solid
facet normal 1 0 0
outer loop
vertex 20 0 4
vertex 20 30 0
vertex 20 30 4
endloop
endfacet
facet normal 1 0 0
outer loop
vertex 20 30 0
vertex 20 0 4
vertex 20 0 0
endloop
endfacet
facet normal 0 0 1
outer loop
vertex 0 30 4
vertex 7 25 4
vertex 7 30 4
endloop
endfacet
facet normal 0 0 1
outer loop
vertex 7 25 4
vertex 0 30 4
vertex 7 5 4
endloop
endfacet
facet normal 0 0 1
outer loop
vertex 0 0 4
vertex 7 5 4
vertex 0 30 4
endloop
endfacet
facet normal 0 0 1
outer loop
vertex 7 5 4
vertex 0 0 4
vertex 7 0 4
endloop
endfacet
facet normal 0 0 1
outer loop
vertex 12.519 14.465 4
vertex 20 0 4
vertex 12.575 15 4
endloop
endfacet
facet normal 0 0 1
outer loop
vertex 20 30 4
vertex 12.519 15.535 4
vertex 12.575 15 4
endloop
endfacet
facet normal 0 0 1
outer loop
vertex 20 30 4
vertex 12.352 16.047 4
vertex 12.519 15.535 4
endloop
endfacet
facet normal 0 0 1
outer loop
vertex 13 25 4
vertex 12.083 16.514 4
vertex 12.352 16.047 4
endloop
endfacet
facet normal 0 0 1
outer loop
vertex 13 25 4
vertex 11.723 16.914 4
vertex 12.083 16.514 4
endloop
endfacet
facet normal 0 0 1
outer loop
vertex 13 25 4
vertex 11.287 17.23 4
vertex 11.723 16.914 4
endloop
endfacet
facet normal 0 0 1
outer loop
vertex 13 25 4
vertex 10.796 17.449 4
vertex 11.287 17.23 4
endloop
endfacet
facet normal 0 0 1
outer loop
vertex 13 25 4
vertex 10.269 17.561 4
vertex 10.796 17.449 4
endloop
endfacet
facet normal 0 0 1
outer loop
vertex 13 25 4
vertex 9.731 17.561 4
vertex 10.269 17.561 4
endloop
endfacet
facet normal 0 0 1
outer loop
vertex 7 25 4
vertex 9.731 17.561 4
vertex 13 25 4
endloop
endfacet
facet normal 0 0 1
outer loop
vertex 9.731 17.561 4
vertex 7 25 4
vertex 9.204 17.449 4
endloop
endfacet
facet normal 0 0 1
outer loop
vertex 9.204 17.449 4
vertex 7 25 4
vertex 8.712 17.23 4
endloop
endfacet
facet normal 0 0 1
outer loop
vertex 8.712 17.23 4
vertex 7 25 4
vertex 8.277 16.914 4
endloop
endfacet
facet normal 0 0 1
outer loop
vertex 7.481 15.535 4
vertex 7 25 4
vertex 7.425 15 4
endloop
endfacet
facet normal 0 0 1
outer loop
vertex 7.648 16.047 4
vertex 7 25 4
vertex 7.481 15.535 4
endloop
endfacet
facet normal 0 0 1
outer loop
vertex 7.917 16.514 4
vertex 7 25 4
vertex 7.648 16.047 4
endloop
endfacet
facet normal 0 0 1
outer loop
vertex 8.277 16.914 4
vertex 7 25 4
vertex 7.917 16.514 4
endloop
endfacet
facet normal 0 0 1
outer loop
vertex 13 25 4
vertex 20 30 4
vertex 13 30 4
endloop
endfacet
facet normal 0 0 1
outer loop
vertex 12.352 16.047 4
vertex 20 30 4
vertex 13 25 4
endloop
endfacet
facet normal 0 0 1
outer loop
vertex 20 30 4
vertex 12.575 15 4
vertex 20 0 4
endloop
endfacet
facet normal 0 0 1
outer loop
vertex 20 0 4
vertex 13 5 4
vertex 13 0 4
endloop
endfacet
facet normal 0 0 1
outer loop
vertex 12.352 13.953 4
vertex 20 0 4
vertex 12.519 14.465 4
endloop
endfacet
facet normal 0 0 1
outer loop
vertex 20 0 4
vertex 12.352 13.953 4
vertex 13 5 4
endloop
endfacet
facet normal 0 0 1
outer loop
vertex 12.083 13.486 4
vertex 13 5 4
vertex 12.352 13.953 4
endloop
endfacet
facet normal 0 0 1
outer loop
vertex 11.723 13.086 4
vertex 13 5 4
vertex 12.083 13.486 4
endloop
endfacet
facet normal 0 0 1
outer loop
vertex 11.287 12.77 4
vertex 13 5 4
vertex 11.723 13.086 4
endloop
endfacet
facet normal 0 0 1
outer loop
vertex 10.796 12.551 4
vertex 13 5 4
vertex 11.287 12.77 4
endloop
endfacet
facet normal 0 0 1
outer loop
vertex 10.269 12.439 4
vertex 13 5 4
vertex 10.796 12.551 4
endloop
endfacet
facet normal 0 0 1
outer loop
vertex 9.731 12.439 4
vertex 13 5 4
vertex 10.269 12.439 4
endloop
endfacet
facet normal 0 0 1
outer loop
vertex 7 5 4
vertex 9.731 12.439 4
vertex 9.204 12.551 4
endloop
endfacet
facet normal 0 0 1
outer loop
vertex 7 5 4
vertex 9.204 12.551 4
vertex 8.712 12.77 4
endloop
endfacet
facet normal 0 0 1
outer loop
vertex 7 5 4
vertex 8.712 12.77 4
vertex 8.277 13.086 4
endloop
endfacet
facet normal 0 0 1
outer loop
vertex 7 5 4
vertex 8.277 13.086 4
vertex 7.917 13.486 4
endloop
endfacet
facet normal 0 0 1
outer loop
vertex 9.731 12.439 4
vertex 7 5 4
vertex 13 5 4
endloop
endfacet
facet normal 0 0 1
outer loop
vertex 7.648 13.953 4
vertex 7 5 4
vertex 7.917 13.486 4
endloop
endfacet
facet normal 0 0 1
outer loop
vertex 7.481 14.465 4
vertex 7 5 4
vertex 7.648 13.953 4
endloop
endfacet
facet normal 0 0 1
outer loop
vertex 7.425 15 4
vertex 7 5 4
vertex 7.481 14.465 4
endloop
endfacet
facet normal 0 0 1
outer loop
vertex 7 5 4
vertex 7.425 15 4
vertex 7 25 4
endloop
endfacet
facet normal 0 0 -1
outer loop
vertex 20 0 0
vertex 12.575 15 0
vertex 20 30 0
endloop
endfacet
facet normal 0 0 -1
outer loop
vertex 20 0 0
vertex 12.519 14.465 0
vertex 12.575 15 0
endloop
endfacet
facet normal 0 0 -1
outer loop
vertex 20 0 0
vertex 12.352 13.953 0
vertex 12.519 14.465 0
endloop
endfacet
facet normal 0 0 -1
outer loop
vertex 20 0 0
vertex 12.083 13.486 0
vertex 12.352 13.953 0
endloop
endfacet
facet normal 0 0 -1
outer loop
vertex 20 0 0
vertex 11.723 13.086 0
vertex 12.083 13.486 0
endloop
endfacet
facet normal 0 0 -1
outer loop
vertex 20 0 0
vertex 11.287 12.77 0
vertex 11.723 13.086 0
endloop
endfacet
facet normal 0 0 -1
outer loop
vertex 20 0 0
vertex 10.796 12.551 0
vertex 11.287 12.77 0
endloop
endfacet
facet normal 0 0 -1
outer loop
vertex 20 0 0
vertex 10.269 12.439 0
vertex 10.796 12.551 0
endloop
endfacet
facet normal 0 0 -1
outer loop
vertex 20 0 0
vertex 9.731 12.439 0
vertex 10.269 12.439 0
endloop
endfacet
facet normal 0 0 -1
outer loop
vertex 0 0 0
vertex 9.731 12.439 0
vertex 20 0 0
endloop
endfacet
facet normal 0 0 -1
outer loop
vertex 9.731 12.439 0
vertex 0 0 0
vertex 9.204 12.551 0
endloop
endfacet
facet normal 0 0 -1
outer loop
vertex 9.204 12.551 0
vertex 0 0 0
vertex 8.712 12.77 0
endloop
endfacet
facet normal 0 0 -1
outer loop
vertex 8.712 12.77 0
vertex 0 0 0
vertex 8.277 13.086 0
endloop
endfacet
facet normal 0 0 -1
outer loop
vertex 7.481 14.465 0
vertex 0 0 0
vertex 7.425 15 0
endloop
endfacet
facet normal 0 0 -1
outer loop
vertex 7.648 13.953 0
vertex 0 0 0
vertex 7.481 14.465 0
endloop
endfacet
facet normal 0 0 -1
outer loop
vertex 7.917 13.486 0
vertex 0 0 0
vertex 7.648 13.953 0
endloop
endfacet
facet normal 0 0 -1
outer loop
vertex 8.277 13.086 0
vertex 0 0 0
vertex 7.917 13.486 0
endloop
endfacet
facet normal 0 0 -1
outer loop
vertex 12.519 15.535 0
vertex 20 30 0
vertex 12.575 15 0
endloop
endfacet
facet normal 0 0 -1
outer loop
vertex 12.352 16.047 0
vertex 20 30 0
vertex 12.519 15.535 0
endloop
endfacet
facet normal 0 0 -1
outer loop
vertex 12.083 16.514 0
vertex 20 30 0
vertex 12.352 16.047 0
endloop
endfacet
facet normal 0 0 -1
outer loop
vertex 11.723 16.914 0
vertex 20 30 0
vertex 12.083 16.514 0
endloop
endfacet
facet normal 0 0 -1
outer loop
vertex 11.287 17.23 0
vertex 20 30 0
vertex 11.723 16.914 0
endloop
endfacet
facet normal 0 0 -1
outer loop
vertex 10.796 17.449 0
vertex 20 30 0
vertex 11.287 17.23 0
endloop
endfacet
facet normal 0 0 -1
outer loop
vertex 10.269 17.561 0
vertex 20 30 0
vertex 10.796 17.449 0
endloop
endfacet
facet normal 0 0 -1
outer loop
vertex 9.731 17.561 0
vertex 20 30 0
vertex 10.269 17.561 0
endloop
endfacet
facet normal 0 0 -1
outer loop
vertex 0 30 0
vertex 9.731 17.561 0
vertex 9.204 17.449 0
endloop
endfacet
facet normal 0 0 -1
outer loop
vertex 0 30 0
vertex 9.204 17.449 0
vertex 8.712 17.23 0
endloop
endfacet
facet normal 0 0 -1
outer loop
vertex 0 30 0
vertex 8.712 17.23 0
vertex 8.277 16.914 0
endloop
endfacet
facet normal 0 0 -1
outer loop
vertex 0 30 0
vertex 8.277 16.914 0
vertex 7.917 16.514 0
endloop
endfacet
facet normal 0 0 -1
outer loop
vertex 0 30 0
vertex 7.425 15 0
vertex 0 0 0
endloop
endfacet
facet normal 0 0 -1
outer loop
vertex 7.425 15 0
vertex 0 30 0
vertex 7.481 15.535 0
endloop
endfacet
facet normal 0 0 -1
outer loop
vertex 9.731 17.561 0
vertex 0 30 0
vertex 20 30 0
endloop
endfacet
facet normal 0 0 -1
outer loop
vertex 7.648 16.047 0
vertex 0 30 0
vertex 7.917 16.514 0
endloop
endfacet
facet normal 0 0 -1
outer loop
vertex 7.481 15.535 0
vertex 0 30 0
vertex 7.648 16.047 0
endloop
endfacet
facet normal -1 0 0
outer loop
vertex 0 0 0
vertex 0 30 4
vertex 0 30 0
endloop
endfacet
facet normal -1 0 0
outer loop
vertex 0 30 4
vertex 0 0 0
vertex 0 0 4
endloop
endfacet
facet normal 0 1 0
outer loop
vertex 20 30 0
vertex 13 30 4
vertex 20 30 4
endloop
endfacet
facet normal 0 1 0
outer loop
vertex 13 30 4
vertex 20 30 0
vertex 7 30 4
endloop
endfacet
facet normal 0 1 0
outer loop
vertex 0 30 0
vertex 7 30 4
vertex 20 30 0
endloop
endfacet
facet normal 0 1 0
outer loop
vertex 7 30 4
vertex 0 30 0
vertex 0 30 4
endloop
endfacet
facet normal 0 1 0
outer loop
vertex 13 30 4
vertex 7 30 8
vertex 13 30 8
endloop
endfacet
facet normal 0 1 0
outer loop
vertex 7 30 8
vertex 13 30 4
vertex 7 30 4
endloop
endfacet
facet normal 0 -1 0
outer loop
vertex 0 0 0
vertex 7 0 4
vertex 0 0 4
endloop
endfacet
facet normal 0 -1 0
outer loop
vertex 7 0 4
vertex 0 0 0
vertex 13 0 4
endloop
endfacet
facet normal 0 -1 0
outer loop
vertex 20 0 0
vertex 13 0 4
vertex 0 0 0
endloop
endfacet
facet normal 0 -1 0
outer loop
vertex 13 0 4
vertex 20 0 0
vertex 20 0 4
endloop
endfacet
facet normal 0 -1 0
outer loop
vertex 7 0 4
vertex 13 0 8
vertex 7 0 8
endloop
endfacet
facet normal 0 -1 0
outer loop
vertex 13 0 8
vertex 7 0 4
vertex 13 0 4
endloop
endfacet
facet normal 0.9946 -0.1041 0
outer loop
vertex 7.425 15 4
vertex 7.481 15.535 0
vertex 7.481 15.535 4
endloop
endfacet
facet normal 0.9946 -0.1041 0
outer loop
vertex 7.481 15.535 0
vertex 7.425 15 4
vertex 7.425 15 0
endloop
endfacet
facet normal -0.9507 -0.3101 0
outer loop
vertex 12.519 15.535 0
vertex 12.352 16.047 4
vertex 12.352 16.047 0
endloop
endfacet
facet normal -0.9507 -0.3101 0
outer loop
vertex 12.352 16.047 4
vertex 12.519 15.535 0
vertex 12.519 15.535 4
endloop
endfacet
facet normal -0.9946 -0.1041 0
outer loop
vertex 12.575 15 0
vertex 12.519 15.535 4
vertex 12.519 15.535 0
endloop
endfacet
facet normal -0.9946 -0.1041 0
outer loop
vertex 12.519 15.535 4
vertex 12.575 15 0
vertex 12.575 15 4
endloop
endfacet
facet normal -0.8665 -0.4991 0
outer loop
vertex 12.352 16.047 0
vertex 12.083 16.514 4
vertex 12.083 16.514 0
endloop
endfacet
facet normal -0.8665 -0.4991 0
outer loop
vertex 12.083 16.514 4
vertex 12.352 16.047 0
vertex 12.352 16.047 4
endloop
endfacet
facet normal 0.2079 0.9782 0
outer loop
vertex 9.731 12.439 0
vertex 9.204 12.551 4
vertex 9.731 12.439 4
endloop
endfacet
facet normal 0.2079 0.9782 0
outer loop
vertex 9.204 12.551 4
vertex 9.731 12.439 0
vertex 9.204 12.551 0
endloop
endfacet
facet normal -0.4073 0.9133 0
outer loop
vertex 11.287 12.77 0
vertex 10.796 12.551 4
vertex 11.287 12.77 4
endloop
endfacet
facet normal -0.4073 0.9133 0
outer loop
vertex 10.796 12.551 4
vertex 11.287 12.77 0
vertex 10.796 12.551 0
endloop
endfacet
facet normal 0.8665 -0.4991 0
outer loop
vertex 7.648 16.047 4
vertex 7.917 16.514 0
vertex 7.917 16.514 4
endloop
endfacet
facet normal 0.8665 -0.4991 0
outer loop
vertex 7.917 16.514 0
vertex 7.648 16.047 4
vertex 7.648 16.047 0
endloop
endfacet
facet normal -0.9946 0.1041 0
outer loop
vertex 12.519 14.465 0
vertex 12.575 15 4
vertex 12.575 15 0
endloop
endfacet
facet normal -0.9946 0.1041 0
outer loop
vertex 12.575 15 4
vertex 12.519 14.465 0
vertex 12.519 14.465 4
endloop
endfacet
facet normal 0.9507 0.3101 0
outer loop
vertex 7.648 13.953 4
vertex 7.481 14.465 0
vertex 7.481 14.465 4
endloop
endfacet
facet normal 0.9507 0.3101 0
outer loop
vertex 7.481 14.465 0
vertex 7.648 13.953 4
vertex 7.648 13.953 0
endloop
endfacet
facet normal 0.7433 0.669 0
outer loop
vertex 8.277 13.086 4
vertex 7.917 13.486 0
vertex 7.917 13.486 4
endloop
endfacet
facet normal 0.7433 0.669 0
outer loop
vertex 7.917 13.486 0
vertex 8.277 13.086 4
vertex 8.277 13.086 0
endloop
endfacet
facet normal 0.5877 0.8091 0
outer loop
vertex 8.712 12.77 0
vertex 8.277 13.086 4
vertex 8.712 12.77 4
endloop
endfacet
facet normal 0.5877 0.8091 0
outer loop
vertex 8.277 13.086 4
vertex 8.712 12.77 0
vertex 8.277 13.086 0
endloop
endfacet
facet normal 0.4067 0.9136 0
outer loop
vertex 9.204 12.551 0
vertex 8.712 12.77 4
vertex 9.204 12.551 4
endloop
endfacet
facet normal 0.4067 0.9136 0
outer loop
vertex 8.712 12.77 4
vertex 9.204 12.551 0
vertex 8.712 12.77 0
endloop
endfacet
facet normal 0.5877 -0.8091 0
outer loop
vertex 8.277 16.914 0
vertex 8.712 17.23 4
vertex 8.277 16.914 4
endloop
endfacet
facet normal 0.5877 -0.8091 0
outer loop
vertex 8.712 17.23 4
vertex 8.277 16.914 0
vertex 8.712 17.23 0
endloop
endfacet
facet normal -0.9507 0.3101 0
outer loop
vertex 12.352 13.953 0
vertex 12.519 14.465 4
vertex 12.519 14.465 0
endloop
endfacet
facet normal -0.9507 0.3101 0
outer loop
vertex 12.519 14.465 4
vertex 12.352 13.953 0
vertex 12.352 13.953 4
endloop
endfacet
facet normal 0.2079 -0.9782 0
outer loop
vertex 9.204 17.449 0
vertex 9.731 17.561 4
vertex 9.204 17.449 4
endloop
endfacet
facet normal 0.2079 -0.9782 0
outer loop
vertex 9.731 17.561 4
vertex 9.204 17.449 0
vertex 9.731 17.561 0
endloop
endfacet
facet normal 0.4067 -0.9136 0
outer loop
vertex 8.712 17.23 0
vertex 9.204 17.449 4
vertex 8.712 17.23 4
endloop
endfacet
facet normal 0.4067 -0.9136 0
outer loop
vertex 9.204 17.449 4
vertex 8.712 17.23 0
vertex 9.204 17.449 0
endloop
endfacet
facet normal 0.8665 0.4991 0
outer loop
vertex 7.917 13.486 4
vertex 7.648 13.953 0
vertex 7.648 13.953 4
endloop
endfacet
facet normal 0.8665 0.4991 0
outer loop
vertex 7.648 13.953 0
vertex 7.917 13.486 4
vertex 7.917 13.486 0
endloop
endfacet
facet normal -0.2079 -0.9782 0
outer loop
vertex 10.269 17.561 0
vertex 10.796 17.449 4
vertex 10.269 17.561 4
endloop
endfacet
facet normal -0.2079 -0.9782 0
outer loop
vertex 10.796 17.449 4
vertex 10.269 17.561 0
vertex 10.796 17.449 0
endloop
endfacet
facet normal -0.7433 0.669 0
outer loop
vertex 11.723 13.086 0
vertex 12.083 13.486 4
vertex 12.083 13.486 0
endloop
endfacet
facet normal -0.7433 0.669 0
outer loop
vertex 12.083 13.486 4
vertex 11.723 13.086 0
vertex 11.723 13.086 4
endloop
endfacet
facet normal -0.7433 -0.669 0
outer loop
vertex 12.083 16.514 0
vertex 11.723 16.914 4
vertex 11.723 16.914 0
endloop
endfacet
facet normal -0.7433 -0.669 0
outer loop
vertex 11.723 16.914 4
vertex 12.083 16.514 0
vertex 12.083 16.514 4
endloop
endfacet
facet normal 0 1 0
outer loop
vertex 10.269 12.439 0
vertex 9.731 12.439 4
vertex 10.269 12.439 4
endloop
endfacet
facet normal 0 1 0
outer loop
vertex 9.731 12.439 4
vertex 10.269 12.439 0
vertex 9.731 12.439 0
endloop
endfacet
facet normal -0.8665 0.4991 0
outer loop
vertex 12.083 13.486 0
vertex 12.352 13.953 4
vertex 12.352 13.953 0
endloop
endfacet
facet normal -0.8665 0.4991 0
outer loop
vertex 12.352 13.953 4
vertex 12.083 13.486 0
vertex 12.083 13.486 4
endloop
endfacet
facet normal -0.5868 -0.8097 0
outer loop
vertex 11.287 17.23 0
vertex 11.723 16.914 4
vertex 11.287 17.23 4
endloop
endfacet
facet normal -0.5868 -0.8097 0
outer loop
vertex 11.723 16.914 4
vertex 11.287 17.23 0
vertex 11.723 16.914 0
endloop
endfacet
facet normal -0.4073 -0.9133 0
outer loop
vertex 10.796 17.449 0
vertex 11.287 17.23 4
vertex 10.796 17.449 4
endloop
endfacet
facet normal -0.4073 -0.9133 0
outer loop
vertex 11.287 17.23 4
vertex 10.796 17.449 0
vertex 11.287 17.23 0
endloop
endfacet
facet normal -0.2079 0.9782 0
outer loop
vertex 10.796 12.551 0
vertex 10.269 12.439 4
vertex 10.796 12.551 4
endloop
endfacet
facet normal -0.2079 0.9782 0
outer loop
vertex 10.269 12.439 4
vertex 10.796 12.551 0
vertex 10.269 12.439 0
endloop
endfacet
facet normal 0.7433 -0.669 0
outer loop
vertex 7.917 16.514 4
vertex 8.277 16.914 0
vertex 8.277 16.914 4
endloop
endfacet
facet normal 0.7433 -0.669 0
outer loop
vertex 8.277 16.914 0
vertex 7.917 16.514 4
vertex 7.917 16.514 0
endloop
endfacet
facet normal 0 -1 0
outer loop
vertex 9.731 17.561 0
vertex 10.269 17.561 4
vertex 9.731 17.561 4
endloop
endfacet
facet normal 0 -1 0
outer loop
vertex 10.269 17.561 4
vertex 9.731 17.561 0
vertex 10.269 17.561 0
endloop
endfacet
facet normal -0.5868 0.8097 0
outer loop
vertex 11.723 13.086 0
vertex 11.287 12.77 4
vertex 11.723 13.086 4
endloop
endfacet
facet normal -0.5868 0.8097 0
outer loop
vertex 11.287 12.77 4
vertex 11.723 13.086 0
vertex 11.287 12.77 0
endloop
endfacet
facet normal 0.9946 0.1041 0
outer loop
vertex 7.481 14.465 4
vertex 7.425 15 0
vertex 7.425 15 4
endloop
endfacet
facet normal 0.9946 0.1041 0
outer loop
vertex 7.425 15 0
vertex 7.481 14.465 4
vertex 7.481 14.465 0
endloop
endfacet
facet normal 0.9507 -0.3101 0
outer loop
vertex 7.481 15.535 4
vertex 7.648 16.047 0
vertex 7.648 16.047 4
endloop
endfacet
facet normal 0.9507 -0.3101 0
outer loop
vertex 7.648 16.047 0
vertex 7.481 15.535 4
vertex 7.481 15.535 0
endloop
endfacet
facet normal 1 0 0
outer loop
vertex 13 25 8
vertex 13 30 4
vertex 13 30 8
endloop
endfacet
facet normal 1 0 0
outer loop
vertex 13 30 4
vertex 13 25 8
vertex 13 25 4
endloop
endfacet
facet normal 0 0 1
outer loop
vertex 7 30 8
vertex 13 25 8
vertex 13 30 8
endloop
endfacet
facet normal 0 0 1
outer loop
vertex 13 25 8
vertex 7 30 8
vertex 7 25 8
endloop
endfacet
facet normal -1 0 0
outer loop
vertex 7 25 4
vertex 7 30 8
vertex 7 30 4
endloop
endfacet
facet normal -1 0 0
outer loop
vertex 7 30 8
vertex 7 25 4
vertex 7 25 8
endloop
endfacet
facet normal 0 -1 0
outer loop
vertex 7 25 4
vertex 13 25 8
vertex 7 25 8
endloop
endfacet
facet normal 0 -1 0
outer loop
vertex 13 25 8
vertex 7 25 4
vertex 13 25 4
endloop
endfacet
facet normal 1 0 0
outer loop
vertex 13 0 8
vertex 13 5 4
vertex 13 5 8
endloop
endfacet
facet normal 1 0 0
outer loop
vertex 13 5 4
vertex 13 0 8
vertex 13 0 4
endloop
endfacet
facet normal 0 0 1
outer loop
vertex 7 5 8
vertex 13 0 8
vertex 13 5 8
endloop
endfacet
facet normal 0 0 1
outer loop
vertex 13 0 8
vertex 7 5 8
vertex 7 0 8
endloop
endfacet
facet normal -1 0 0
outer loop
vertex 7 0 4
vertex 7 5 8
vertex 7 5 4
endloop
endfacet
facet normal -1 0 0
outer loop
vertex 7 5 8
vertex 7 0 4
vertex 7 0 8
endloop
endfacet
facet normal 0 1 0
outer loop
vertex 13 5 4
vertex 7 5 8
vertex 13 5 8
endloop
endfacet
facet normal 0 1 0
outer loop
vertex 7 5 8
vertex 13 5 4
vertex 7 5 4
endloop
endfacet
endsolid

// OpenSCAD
inner=6;
outer=20;
screwhole=5 + 0.15;
height=4;

stock=5;
stockheight=4;

module mount(length=30, holes=1)
{
	difference()
	{
		cube([outer,length,height]);
		
		union()
		{
			for(i=[1:holes])
			{
				translate([outer/2,i*length/(holes+1)])
					cylinder(d=screwhole,h=height,$fn=30);
			}
			
		}
	}
	
	translate([outer/2-inner/2,length-stock,height])
		cube([inner,stock,stockheight]);
	
	translate([outer/2-inner/2,0,height])
		cube([inner,stock,stockheight]);
	
}



mount();
